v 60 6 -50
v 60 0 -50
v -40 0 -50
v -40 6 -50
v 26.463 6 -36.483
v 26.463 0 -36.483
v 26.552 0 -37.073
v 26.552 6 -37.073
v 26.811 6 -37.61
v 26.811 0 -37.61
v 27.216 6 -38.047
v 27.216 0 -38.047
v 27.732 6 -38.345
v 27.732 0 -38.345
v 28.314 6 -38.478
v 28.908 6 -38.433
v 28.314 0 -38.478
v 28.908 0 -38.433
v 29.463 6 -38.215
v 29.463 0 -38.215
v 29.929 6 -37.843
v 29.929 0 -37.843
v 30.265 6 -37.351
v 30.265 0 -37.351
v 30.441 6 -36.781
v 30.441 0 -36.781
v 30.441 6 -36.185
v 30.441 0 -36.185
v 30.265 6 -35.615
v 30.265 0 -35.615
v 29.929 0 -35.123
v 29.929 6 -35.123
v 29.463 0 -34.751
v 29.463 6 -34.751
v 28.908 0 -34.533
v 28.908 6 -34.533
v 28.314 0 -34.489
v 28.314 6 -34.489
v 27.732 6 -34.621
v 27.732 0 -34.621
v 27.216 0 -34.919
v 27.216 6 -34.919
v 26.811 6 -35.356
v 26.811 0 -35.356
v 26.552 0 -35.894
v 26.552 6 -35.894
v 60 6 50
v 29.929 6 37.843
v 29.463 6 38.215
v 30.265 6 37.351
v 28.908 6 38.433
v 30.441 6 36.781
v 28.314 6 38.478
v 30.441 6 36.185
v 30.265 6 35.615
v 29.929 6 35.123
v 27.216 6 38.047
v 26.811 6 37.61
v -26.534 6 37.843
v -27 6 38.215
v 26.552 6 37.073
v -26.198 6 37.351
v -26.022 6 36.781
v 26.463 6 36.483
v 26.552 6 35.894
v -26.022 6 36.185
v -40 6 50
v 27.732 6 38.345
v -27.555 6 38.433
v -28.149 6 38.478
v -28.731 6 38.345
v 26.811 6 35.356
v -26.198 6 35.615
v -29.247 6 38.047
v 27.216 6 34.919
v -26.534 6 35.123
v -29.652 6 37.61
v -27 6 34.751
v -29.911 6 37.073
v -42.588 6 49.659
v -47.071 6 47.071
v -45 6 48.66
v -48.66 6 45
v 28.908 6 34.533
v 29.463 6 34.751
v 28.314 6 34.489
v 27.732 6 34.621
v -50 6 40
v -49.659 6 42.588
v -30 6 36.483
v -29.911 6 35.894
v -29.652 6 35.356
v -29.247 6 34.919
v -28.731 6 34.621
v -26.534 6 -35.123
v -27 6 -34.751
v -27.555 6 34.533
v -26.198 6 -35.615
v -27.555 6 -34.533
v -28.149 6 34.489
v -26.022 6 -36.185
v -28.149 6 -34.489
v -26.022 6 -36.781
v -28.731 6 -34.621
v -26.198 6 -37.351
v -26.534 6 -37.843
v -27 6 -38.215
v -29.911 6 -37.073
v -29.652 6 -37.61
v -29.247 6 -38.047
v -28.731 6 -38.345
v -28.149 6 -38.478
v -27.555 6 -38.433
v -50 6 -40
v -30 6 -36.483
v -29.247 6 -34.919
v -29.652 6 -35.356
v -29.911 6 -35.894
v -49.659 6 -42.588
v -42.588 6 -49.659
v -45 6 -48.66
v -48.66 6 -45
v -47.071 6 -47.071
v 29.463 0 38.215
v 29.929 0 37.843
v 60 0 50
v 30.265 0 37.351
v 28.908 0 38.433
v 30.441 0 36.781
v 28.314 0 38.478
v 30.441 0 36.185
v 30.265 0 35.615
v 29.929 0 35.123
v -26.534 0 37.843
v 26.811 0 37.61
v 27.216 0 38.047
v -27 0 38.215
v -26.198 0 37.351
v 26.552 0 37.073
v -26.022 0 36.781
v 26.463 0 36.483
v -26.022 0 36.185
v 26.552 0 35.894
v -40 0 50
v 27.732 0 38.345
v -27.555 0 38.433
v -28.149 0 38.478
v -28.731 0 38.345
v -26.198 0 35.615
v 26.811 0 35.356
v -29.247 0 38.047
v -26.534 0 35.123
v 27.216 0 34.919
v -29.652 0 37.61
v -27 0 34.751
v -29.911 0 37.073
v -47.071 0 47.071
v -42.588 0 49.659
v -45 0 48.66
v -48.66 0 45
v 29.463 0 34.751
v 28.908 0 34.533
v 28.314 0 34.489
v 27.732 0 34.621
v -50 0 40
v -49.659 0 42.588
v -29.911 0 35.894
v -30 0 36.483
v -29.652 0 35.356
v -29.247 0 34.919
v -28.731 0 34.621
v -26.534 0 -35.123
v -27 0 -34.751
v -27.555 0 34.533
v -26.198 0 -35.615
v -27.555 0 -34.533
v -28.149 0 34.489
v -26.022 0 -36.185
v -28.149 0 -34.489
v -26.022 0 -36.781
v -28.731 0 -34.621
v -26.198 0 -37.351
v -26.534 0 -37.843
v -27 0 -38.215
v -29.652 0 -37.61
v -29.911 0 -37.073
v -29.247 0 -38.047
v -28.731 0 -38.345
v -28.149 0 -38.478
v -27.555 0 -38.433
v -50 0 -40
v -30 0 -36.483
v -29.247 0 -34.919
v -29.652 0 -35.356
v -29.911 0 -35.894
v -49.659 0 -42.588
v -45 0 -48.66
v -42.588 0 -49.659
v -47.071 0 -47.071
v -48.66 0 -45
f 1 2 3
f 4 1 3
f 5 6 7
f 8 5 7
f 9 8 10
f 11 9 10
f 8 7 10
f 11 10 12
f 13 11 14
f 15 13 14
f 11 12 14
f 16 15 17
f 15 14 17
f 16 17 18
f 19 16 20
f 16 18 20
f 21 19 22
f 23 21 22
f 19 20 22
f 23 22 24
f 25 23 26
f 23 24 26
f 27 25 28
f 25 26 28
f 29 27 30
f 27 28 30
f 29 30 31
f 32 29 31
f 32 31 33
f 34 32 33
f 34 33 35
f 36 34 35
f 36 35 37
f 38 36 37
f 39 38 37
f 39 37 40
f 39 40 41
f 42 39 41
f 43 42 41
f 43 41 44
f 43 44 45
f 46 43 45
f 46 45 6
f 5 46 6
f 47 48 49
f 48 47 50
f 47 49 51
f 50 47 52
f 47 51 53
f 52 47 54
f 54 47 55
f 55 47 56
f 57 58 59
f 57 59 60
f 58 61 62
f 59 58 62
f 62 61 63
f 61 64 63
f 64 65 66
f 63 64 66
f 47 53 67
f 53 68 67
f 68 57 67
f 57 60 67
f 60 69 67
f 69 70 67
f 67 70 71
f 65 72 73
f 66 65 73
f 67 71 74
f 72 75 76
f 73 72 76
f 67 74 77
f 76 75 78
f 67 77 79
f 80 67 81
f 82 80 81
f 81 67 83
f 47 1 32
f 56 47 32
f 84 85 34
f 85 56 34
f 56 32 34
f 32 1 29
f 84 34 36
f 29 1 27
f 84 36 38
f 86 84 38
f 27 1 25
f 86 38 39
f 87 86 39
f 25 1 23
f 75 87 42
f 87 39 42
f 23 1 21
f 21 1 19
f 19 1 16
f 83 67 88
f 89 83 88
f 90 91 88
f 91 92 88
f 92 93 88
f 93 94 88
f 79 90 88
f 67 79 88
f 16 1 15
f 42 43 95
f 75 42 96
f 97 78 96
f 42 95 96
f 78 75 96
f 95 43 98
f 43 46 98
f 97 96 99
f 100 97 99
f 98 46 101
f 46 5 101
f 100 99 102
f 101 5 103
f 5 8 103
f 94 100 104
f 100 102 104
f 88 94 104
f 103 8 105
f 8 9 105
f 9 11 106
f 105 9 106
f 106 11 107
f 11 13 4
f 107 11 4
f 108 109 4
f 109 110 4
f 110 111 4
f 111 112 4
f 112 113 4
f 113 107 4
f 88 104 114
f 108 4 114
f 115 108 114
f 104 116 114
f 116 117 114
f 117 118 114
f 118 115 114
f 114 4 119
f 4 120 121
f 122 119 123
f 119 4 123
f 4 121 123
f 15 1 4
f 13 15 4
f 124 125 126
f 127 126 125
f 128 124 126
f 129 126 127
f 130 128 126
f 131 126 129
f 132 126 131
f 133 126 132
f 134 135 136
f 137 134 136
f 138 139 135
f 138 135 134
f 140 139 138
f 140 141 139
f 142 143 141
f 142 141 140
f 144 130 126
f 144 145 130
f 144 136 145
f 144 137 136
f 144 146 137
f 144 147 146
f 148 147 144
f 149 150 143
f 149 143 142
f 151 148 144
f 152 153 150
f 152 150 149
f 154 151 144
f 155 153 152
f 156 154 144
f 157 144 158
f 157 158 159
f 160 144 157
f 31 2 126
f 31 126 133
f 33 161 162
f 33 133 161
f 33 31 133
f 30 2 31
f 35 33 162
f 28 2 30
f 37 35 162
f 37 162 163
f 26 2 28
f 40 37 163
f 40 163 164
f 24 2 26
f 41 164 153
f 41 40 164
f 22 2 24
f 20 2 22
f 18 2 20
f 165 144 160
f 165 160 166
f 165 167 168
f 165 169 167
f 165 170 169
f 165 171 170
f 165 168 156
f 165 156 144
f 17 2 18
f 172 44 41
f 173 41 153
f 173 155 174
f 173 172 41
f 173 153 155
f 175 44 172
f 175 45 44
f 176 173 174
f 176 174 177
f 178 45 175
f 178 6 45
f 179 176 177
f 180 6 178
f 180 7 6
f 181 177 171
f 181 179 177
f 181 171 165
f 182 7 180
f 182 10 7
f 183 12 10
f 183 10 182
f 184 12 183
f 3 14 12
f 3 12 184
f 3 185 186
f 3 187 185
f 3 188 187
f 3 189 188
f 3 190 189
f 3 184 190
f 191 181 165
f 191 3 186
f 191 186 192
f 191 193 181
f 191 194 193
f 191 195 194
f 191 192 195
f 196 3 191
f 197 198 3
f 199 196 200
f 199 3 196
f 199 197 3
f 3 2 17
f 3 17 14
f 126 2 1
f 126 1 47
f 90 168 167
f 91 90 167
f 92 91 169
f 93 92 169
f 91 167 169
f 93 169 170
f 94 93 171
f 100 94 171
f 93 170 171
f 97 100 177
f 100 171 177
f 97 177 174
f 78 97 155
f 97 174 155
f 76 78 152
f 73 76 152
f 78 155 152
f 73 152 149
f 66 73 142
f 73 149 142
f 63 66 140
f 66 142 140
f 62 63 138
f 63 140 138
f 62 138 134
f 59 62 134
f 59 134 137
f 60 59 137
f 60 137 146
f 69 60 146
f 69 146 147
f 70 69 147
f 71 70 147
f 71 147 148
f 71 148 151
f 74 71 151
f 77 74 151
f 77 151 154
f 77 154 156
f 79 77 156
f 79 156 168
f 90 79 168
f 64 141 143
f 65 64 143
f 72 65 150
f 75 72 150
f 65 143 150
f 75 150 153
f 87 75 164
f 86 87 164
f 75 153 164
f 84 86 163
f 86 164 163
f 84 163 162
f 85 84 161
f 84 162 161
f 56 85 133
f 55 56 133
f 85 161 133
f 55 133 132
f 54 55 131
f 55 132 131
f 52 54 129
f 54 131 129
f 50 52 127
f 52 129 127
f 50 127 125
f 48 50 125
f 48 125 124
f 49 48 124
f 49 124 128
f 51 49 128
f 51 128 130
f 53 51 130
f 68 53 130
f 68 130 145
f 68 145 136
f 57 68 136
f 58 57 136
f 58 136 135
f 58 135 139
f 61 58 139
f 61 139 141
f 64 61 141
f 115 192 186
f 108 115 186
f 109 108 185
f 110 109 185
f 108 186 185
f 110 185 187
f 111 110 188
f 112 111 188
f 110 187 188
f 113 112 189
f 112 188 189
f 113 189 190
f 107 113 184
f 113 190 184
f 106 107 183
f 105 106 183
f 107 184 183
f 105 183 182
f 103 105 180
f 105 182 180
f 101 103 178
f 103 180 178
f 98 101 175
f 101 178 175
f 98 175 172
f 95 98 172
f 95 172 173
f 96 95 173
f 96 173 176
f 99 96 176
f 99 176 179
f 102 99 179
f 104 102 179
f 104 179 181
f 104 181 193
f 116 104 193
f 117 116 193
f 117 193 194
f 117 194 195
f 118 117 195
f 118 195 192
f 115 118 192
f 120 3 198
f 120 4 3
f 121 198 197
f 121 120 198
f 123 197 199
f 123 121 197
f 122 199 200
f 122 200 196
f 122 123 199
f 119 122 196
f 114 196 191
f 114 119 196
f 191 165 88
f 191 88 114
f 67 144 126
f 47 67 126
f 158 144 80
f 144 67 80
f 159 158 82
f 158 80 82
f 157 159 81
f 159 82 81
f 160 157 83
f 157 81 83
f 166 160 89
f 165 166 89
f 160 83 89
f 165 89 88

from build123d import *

# Parameters (mm, degrees)
BOSS_EXTRUDE1_DEPTH       = 6
FILLET1_R                 = 10
F_4_0MM_DOWEL_HOLE1_D     = 4
F_4_0MM_DOWEL_HOLE1_DEPTH = 98.31
F_4_0MM_DOWEL_HOLE1_TIP   = 1.201721238


with BuildPart() as part:
    # Sketch1 → Boss-Extrude1 (new body)
    with BuildSketch(Plane(origin=(0, 0, 0), x_dir=(1, 0, 0), z_dir=(0, 1, 0))):
        Polygon((50, 50), (60, 50), (60, -50), (50, -50), (-50, -50), (-50, 50), align=None)
    extrude(amount=BOSS_EXTRUDE1_DEPTH)

    # Fillet1
    fillet1_edges = [part.edges().sort_by_distance(p)[0] for p in [
        (-50, 3, -50),
        (-50, 3, 50),
    ]]
    fillet(fillet1_edges, radius=FILLET1_R)

    # Ø4.0mm Dowel Hole1
    with Locations(Plane(origin=(0, 6, 0), x_dir=(1, 0, 0), z_dir=(0, 1, 0))):
        with Locations((-28, 36.483109463), (28.463106056, 36.483109463), (-28, -36.483109463), (28.463106056, -36.483109463)):
            Hole(F_4_0MM_DOWEL_HOLE1_D / 2, depth=F_4_0MM_DOWEL_HOLE1_DEPTH)
            with Locations((0, 0, -(F_4_0MM_DOWEL_HOLE1_DEPTH + F_4_0MM_DOWEL_HOLE1_TIP / 2))):  # 118° drill point
                Cone(0, F_4_0MM_DOWEL_HOLE1_D / 2, F_4_0MM_DOWEL_HOLE1_TIP, mode=Mode.SUBTRACT)


solid = part.part
